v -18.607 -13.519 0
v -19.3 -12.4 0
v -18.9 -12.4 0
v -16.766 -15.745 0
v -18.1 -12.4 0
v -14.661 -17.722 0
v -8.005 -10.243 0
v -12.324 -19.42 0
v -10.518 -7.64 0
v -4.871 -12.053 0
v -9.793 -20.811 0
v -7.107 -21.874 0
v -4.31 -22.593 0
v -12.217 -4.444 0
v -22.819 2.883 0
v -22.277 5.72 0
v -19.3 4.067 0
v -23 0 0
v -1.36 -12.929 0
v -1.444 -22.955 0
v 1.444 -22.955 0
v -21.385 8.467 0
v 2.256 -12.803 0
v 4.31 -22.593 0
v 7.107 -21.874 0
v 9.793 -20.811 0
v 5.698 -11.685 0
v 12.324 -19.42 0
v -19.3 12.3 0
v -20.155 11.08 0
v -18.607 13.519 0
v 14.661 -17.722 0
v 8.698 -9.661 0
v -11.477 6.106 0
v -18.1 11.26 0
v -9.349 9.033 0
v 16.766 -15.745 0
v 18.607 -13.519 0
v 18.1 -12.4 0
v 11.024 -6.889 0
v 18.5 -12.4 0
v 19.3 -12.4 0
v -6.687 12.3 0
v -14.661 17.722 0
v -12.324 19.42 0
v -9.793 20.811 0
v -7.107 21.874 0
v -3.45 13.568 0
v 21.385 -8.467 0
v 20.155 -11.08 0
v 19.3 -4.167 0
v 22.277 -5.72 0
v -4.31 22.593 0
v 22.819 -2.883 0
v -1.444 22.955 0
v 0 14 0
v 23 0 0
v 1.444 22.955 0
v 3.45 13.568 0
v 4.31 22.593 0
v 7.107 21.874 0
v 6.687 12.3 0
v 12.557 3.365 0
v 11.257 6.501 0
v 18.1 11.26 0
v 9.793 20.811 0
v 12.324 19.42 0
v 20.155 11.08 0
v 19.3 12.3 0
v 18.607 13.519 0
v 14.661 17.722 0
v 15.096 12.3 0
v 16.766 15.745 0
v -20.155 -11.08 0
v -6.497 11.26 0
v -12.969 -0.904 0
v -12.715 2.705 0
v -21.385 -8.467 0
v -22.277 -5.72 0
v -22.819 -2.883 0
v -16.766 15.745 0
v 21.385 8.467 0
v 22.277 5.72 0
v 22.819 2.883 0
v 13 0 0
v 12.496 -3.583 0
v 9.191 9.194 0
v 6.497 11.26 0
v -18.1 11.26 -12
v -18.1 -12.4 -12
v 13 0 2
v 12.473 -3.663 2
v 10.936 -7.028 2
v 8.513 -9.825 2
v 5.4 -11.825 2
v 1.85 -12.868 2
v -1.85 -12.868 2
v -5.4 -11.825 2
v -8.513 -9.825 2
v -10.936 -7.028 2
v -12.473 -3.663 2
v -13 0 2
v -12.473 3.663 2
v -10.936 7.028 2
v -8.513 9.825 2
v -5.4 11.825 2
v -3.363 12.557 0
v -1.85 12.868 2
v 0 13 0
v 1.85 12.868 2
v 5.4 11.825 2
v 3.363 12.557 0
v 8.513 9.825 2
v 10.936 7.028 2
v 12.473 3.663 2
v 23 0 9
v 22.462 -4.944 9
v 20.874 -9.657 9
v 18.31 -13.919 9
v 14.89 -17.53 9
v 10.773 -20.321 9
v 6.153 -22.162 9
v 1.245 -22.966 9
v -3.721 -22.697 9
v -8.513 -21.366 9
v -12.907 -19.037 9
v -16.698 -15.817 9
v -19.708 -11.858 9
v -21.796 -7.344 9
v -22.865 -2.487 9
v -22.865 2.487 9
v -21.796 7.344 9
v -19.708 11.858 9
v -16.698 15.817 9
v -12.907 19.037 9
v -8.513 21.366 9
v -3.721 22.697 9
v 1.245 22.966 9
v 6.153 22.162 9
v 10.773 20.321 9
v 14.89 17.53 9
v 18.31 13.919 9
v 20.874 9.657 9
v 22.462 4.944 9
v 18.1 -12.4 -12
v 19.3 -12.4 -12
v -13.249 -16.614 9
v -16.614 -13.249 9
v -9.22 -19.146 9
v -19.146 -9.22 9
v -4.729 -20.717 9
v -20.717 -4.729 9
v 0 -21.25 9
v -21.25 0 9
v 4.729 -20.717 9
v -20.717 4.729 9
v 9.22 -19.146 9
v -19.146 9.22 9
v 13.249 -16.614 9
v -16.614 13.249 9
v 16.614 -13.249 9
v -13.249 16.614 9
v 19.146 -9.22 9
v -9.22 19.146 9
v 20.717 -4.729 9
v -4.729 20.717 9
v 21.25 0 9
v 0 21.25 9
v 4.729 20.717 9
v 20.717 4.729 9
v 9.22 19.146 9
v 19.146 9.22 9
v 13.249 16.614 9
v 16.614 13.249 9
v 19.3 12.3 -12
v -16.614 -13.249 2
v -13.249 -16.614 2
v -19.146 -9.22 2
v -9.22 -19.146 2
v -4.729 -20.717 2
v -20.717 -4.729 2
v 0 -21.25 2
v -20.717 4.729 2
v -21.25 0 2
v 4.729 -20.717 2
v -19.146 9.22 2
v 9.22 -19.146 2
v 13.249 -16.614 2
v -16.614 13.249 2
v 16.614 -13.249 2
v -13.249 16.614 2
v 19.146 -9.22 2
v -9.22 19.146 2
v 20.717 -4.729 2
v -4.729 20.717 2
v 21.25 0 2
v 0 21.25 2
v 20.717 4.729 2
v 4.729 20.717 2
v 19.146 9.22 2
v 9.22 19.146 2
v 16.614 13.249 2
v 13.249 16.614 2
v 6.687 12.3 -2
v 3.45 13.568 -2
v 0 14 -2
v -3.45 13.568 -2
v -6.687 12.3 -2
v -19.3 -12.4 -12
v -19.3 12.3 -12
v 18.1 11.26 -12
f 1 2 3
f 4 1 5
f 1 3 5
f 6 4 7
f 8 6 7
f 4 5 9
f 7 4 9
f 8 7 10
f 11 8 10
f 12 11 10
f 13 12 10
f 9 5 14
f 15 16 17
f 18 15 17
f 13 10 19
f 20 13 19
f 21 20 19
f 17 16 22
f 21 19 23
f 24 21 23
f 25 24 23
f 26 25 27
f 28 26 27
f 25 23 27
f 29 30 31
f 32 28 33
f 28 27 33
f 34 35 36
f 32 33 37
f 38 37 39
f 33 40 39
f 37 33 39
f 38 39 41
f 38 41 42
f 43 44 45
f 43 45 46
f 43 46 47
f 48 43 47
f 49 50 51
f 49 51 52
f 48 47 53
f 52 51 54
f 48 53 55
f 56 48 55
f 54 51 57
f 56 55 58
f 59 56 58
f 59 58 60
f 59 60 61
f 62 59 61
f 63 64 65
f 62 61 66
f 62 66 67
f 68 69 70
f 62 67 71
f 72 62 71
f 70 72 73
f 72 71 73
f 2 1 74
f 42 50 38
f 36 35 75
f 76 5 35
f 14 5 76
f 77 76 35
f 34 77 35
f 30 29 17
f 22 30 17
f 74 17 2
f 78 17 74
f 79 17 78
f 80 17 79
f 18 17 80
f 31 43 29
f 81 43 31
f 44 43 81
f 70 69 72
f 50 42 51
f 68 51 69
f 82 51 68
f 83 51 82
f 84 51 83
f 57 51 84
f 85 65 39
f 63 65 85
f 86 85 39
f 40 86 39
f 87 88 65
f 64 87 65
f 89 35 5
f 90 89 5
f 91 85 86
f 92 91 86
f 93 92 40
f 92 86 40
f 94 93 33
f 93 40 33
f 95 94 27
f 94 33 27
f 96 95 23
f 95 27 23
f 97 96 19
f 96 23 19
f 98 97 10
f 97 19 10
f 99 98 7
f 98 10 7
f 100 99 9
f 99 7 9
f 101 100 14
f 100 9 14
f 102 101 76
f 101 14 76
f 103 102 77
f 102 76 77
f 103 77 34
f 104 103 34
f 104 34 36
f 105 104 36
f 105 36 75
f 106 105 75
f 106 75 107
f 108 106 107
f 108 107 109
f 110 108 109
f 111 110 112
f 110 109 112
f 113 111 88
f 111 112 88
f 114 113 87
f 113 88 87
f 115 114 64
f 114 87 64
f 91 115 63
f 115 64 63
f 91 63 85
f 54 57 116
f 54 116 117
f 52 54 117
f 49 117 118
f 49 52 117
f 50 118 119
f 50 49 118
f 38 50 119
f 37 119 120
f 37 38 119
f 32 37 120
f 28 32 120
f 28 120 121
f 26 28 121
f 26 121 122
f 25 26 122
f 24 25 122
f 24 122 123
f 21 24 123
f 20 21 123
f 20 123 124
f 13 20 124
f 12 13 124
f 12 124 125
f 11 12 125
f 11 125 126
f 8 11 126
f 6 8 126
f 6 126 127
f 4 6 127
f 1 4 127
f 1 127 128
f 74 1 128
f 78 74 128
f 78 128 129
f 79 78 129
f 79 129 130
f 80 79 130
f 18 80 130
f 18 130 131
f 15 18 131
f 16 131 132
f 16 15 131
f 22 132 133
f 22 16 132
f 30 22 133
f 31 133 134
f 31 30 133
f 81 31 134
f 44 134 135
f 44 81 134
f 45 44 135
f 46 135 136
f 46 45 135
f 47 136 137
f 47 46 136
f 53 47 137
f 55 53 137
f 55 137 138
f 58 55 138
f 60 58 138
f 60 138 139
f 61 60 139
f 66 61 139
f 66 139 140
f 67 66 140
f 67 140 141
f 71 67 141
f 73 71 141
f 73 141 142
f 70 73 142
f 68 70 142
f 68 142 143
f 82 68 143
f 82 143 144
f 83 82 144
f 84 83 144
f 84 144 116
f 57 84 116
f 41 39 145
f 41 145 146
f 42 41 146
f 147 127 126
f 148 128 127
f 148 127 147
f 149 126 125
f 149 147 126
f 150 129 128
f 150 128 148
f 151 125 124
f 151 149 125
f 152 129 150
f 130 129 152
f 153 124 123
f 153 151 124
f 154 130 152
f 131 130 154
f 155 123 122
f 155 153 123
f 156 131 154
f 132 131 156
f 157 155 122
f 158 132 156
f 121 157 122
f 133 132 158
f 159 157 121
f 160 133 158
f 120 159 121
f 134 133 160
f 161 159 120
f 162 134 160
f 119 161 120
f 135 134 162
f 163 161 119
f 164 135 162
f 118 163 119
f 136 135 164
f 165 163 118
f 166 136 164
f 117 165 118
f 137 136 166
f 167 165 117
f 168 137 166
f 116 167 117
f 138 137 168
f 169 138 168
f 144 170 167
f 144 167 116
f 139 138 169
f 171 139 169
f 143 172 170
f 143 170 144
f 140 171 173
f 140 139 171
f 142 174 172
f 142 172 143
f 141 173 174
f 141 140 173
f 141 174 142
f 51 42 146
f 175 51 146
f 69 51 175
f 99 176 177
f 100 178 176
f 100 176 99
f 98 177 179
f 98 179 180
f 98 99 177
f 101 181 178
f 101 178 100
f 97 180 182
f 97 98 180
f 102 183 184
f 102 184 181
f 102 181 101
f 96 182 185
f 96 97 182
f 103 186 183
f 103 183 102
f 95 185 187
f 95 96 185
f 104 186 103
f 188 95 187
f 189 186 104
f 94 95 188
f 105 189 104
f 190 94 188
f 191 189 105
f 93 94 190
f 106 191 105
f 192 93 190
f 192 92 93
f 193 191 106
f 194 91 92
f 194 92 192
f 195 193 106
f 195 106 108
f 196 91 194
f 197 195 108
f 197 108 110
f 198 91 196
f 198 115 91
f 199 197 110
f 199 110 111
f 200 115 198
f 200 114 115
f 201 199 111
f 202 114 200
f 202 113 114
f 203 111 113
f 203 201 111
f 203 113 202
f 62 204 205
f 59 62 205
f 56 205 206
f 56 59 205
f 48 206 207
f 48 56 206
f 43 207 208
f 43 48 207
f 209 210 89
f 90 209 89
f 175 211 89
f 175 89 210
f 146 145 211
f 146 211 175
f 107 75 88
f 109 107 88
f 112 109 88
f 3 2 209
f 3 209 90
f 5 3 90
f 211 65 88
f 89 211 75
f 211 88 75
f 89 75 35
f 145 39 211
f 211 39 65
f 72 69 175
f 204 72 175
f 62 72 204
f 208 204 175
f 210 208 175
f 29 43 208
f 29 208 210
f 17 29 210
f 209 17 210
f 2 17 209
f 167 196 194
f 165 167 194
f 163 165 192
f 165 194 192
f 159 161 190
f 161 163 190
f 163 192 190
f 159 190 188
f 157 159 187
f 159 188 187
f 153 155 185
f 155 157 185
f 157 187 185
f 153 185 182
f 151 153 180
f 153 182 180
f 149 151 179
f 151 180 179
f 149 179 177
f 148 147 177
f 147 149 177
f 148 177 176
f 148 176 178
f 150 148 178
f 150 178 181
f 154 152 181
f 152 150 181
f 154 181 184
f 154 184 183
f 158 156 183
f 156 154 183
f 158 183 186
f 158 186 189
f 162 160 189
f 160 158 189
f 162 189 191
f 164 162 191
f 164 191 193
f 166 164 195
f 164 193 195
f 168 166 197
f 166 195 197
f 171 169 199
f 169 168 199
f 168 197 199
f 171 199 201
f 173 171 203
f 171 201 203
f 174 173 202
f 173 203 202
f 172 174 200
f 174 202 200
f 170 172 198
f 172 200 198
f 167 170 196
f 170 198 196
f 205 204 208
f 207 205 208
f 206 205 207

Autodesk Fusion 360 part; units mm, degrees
sketch "スケッチ1" plane through (0, 0, 0) normal (0, 0, 1) x (1, 0, 0)
  circle A0 centre (0, 0) radius 23
  circle A1 centre (0, 0) radius 21.25
  dimension "d1" = 46
  dimension "d2" = 42.5
extrude "押し出し1" add sketch "スケッチ1" along normal blind 2 contours A1
extrude "押し出し2" add sketch "スケッチ1" along normal blind 9
sketch "スケッチ2" plane through (0, 0, 0) normal (0, 0, -1) x (1, 0, 0)
  circle A0 centre (0, 0) radius 23
  circle A1 centre (0, 0) radius 13
  dimension "d7" = 26
extrude "押し出し3" cut sketch "スケッチ2" against normal blind 3 contours A1
sketch "スケッチ3" plane through (0, 0, 0) normal (0, 0, -1) x (1, 0, 0)
  circle A0 centre (0, 0) radius 13
  circle A1 centre (0, 0) radius 23
  line L0 (18.1, -11.26) -> (-18.1, -11.26)
  line L1 (-18.1, -11.26) -> (-18.1, 14.3567)
  line L2 (-18.1, 14.3567) -> (18.1, 14.3567)
  line L3 (18.1, 14.3567) -> (18.1, -11.26)
  line L4 (19.3, -12.3) -> (-19.3, -12.3)
  line L5 (-19.3, -12.3) -> (-19.3, 12.4)
  line L6 (-19.3, 12.4) -> (19.3, 12.4)
  line L7 (19.3, 12.4) -> (19.3, -12.3)
  dimension "d10" = 11.26
  dimension "d11" = 18.1
  dimension "d12" = 18.1
  dimension "d13" = 12.3
  dimension "d14" = 19.3
  dimension "d15" = 19.3
  dimension "d16" = 12.4
extrude "押し出し4" add sketch "スケッチ3" along normal blind 12 contours A0 L0 L3 L4 L6 L7 | A0 L0 L4 | A0 L0 L1 L4 L5 L6
sketch "スケッチ4" plane through (0, 0, 0) normal (0, 0, 1) x (-1, 0, 0)
  arc A0 (4.2083, -12.3) -> (6.4971, -11.26) centre (0, 0) ccw
  line L0 (6.4971, -11.26) -> (-6.4971, -11.26)
  arc A1 (-6.4971, -11.26) -> (-4.2083, -12.3) centre (0, 0) ccw
  line L1 (-4.2083, -12.3) -> (4.2083, -12.3)
  line L2 (8.6335, -10.0758) -> (-7.7138, -10.0758)
  line L3 (-7.7138, -10.0758) -> (-7.7138, -15.2171)
  line L4 (-7.7138, -15.2171) -> (8.6335, -15.2171)
  line L5 (8.6335, -15.2171) -> (8.6335, -10.0758)
  circle A2 centre (0, 0) radius 13
  circle A3 centre (0, 0) radius 14
  line L6 (9.1438, -11.26) -> (-8.6053, -11.26)
  dimension "d19" = 26
  dimension "d20" = 28
extrude "押し出し5" add sketch "スケッチ4" against normal blind 2 contours L1 A2 | A0 A1 L3 A2 A3 L6
